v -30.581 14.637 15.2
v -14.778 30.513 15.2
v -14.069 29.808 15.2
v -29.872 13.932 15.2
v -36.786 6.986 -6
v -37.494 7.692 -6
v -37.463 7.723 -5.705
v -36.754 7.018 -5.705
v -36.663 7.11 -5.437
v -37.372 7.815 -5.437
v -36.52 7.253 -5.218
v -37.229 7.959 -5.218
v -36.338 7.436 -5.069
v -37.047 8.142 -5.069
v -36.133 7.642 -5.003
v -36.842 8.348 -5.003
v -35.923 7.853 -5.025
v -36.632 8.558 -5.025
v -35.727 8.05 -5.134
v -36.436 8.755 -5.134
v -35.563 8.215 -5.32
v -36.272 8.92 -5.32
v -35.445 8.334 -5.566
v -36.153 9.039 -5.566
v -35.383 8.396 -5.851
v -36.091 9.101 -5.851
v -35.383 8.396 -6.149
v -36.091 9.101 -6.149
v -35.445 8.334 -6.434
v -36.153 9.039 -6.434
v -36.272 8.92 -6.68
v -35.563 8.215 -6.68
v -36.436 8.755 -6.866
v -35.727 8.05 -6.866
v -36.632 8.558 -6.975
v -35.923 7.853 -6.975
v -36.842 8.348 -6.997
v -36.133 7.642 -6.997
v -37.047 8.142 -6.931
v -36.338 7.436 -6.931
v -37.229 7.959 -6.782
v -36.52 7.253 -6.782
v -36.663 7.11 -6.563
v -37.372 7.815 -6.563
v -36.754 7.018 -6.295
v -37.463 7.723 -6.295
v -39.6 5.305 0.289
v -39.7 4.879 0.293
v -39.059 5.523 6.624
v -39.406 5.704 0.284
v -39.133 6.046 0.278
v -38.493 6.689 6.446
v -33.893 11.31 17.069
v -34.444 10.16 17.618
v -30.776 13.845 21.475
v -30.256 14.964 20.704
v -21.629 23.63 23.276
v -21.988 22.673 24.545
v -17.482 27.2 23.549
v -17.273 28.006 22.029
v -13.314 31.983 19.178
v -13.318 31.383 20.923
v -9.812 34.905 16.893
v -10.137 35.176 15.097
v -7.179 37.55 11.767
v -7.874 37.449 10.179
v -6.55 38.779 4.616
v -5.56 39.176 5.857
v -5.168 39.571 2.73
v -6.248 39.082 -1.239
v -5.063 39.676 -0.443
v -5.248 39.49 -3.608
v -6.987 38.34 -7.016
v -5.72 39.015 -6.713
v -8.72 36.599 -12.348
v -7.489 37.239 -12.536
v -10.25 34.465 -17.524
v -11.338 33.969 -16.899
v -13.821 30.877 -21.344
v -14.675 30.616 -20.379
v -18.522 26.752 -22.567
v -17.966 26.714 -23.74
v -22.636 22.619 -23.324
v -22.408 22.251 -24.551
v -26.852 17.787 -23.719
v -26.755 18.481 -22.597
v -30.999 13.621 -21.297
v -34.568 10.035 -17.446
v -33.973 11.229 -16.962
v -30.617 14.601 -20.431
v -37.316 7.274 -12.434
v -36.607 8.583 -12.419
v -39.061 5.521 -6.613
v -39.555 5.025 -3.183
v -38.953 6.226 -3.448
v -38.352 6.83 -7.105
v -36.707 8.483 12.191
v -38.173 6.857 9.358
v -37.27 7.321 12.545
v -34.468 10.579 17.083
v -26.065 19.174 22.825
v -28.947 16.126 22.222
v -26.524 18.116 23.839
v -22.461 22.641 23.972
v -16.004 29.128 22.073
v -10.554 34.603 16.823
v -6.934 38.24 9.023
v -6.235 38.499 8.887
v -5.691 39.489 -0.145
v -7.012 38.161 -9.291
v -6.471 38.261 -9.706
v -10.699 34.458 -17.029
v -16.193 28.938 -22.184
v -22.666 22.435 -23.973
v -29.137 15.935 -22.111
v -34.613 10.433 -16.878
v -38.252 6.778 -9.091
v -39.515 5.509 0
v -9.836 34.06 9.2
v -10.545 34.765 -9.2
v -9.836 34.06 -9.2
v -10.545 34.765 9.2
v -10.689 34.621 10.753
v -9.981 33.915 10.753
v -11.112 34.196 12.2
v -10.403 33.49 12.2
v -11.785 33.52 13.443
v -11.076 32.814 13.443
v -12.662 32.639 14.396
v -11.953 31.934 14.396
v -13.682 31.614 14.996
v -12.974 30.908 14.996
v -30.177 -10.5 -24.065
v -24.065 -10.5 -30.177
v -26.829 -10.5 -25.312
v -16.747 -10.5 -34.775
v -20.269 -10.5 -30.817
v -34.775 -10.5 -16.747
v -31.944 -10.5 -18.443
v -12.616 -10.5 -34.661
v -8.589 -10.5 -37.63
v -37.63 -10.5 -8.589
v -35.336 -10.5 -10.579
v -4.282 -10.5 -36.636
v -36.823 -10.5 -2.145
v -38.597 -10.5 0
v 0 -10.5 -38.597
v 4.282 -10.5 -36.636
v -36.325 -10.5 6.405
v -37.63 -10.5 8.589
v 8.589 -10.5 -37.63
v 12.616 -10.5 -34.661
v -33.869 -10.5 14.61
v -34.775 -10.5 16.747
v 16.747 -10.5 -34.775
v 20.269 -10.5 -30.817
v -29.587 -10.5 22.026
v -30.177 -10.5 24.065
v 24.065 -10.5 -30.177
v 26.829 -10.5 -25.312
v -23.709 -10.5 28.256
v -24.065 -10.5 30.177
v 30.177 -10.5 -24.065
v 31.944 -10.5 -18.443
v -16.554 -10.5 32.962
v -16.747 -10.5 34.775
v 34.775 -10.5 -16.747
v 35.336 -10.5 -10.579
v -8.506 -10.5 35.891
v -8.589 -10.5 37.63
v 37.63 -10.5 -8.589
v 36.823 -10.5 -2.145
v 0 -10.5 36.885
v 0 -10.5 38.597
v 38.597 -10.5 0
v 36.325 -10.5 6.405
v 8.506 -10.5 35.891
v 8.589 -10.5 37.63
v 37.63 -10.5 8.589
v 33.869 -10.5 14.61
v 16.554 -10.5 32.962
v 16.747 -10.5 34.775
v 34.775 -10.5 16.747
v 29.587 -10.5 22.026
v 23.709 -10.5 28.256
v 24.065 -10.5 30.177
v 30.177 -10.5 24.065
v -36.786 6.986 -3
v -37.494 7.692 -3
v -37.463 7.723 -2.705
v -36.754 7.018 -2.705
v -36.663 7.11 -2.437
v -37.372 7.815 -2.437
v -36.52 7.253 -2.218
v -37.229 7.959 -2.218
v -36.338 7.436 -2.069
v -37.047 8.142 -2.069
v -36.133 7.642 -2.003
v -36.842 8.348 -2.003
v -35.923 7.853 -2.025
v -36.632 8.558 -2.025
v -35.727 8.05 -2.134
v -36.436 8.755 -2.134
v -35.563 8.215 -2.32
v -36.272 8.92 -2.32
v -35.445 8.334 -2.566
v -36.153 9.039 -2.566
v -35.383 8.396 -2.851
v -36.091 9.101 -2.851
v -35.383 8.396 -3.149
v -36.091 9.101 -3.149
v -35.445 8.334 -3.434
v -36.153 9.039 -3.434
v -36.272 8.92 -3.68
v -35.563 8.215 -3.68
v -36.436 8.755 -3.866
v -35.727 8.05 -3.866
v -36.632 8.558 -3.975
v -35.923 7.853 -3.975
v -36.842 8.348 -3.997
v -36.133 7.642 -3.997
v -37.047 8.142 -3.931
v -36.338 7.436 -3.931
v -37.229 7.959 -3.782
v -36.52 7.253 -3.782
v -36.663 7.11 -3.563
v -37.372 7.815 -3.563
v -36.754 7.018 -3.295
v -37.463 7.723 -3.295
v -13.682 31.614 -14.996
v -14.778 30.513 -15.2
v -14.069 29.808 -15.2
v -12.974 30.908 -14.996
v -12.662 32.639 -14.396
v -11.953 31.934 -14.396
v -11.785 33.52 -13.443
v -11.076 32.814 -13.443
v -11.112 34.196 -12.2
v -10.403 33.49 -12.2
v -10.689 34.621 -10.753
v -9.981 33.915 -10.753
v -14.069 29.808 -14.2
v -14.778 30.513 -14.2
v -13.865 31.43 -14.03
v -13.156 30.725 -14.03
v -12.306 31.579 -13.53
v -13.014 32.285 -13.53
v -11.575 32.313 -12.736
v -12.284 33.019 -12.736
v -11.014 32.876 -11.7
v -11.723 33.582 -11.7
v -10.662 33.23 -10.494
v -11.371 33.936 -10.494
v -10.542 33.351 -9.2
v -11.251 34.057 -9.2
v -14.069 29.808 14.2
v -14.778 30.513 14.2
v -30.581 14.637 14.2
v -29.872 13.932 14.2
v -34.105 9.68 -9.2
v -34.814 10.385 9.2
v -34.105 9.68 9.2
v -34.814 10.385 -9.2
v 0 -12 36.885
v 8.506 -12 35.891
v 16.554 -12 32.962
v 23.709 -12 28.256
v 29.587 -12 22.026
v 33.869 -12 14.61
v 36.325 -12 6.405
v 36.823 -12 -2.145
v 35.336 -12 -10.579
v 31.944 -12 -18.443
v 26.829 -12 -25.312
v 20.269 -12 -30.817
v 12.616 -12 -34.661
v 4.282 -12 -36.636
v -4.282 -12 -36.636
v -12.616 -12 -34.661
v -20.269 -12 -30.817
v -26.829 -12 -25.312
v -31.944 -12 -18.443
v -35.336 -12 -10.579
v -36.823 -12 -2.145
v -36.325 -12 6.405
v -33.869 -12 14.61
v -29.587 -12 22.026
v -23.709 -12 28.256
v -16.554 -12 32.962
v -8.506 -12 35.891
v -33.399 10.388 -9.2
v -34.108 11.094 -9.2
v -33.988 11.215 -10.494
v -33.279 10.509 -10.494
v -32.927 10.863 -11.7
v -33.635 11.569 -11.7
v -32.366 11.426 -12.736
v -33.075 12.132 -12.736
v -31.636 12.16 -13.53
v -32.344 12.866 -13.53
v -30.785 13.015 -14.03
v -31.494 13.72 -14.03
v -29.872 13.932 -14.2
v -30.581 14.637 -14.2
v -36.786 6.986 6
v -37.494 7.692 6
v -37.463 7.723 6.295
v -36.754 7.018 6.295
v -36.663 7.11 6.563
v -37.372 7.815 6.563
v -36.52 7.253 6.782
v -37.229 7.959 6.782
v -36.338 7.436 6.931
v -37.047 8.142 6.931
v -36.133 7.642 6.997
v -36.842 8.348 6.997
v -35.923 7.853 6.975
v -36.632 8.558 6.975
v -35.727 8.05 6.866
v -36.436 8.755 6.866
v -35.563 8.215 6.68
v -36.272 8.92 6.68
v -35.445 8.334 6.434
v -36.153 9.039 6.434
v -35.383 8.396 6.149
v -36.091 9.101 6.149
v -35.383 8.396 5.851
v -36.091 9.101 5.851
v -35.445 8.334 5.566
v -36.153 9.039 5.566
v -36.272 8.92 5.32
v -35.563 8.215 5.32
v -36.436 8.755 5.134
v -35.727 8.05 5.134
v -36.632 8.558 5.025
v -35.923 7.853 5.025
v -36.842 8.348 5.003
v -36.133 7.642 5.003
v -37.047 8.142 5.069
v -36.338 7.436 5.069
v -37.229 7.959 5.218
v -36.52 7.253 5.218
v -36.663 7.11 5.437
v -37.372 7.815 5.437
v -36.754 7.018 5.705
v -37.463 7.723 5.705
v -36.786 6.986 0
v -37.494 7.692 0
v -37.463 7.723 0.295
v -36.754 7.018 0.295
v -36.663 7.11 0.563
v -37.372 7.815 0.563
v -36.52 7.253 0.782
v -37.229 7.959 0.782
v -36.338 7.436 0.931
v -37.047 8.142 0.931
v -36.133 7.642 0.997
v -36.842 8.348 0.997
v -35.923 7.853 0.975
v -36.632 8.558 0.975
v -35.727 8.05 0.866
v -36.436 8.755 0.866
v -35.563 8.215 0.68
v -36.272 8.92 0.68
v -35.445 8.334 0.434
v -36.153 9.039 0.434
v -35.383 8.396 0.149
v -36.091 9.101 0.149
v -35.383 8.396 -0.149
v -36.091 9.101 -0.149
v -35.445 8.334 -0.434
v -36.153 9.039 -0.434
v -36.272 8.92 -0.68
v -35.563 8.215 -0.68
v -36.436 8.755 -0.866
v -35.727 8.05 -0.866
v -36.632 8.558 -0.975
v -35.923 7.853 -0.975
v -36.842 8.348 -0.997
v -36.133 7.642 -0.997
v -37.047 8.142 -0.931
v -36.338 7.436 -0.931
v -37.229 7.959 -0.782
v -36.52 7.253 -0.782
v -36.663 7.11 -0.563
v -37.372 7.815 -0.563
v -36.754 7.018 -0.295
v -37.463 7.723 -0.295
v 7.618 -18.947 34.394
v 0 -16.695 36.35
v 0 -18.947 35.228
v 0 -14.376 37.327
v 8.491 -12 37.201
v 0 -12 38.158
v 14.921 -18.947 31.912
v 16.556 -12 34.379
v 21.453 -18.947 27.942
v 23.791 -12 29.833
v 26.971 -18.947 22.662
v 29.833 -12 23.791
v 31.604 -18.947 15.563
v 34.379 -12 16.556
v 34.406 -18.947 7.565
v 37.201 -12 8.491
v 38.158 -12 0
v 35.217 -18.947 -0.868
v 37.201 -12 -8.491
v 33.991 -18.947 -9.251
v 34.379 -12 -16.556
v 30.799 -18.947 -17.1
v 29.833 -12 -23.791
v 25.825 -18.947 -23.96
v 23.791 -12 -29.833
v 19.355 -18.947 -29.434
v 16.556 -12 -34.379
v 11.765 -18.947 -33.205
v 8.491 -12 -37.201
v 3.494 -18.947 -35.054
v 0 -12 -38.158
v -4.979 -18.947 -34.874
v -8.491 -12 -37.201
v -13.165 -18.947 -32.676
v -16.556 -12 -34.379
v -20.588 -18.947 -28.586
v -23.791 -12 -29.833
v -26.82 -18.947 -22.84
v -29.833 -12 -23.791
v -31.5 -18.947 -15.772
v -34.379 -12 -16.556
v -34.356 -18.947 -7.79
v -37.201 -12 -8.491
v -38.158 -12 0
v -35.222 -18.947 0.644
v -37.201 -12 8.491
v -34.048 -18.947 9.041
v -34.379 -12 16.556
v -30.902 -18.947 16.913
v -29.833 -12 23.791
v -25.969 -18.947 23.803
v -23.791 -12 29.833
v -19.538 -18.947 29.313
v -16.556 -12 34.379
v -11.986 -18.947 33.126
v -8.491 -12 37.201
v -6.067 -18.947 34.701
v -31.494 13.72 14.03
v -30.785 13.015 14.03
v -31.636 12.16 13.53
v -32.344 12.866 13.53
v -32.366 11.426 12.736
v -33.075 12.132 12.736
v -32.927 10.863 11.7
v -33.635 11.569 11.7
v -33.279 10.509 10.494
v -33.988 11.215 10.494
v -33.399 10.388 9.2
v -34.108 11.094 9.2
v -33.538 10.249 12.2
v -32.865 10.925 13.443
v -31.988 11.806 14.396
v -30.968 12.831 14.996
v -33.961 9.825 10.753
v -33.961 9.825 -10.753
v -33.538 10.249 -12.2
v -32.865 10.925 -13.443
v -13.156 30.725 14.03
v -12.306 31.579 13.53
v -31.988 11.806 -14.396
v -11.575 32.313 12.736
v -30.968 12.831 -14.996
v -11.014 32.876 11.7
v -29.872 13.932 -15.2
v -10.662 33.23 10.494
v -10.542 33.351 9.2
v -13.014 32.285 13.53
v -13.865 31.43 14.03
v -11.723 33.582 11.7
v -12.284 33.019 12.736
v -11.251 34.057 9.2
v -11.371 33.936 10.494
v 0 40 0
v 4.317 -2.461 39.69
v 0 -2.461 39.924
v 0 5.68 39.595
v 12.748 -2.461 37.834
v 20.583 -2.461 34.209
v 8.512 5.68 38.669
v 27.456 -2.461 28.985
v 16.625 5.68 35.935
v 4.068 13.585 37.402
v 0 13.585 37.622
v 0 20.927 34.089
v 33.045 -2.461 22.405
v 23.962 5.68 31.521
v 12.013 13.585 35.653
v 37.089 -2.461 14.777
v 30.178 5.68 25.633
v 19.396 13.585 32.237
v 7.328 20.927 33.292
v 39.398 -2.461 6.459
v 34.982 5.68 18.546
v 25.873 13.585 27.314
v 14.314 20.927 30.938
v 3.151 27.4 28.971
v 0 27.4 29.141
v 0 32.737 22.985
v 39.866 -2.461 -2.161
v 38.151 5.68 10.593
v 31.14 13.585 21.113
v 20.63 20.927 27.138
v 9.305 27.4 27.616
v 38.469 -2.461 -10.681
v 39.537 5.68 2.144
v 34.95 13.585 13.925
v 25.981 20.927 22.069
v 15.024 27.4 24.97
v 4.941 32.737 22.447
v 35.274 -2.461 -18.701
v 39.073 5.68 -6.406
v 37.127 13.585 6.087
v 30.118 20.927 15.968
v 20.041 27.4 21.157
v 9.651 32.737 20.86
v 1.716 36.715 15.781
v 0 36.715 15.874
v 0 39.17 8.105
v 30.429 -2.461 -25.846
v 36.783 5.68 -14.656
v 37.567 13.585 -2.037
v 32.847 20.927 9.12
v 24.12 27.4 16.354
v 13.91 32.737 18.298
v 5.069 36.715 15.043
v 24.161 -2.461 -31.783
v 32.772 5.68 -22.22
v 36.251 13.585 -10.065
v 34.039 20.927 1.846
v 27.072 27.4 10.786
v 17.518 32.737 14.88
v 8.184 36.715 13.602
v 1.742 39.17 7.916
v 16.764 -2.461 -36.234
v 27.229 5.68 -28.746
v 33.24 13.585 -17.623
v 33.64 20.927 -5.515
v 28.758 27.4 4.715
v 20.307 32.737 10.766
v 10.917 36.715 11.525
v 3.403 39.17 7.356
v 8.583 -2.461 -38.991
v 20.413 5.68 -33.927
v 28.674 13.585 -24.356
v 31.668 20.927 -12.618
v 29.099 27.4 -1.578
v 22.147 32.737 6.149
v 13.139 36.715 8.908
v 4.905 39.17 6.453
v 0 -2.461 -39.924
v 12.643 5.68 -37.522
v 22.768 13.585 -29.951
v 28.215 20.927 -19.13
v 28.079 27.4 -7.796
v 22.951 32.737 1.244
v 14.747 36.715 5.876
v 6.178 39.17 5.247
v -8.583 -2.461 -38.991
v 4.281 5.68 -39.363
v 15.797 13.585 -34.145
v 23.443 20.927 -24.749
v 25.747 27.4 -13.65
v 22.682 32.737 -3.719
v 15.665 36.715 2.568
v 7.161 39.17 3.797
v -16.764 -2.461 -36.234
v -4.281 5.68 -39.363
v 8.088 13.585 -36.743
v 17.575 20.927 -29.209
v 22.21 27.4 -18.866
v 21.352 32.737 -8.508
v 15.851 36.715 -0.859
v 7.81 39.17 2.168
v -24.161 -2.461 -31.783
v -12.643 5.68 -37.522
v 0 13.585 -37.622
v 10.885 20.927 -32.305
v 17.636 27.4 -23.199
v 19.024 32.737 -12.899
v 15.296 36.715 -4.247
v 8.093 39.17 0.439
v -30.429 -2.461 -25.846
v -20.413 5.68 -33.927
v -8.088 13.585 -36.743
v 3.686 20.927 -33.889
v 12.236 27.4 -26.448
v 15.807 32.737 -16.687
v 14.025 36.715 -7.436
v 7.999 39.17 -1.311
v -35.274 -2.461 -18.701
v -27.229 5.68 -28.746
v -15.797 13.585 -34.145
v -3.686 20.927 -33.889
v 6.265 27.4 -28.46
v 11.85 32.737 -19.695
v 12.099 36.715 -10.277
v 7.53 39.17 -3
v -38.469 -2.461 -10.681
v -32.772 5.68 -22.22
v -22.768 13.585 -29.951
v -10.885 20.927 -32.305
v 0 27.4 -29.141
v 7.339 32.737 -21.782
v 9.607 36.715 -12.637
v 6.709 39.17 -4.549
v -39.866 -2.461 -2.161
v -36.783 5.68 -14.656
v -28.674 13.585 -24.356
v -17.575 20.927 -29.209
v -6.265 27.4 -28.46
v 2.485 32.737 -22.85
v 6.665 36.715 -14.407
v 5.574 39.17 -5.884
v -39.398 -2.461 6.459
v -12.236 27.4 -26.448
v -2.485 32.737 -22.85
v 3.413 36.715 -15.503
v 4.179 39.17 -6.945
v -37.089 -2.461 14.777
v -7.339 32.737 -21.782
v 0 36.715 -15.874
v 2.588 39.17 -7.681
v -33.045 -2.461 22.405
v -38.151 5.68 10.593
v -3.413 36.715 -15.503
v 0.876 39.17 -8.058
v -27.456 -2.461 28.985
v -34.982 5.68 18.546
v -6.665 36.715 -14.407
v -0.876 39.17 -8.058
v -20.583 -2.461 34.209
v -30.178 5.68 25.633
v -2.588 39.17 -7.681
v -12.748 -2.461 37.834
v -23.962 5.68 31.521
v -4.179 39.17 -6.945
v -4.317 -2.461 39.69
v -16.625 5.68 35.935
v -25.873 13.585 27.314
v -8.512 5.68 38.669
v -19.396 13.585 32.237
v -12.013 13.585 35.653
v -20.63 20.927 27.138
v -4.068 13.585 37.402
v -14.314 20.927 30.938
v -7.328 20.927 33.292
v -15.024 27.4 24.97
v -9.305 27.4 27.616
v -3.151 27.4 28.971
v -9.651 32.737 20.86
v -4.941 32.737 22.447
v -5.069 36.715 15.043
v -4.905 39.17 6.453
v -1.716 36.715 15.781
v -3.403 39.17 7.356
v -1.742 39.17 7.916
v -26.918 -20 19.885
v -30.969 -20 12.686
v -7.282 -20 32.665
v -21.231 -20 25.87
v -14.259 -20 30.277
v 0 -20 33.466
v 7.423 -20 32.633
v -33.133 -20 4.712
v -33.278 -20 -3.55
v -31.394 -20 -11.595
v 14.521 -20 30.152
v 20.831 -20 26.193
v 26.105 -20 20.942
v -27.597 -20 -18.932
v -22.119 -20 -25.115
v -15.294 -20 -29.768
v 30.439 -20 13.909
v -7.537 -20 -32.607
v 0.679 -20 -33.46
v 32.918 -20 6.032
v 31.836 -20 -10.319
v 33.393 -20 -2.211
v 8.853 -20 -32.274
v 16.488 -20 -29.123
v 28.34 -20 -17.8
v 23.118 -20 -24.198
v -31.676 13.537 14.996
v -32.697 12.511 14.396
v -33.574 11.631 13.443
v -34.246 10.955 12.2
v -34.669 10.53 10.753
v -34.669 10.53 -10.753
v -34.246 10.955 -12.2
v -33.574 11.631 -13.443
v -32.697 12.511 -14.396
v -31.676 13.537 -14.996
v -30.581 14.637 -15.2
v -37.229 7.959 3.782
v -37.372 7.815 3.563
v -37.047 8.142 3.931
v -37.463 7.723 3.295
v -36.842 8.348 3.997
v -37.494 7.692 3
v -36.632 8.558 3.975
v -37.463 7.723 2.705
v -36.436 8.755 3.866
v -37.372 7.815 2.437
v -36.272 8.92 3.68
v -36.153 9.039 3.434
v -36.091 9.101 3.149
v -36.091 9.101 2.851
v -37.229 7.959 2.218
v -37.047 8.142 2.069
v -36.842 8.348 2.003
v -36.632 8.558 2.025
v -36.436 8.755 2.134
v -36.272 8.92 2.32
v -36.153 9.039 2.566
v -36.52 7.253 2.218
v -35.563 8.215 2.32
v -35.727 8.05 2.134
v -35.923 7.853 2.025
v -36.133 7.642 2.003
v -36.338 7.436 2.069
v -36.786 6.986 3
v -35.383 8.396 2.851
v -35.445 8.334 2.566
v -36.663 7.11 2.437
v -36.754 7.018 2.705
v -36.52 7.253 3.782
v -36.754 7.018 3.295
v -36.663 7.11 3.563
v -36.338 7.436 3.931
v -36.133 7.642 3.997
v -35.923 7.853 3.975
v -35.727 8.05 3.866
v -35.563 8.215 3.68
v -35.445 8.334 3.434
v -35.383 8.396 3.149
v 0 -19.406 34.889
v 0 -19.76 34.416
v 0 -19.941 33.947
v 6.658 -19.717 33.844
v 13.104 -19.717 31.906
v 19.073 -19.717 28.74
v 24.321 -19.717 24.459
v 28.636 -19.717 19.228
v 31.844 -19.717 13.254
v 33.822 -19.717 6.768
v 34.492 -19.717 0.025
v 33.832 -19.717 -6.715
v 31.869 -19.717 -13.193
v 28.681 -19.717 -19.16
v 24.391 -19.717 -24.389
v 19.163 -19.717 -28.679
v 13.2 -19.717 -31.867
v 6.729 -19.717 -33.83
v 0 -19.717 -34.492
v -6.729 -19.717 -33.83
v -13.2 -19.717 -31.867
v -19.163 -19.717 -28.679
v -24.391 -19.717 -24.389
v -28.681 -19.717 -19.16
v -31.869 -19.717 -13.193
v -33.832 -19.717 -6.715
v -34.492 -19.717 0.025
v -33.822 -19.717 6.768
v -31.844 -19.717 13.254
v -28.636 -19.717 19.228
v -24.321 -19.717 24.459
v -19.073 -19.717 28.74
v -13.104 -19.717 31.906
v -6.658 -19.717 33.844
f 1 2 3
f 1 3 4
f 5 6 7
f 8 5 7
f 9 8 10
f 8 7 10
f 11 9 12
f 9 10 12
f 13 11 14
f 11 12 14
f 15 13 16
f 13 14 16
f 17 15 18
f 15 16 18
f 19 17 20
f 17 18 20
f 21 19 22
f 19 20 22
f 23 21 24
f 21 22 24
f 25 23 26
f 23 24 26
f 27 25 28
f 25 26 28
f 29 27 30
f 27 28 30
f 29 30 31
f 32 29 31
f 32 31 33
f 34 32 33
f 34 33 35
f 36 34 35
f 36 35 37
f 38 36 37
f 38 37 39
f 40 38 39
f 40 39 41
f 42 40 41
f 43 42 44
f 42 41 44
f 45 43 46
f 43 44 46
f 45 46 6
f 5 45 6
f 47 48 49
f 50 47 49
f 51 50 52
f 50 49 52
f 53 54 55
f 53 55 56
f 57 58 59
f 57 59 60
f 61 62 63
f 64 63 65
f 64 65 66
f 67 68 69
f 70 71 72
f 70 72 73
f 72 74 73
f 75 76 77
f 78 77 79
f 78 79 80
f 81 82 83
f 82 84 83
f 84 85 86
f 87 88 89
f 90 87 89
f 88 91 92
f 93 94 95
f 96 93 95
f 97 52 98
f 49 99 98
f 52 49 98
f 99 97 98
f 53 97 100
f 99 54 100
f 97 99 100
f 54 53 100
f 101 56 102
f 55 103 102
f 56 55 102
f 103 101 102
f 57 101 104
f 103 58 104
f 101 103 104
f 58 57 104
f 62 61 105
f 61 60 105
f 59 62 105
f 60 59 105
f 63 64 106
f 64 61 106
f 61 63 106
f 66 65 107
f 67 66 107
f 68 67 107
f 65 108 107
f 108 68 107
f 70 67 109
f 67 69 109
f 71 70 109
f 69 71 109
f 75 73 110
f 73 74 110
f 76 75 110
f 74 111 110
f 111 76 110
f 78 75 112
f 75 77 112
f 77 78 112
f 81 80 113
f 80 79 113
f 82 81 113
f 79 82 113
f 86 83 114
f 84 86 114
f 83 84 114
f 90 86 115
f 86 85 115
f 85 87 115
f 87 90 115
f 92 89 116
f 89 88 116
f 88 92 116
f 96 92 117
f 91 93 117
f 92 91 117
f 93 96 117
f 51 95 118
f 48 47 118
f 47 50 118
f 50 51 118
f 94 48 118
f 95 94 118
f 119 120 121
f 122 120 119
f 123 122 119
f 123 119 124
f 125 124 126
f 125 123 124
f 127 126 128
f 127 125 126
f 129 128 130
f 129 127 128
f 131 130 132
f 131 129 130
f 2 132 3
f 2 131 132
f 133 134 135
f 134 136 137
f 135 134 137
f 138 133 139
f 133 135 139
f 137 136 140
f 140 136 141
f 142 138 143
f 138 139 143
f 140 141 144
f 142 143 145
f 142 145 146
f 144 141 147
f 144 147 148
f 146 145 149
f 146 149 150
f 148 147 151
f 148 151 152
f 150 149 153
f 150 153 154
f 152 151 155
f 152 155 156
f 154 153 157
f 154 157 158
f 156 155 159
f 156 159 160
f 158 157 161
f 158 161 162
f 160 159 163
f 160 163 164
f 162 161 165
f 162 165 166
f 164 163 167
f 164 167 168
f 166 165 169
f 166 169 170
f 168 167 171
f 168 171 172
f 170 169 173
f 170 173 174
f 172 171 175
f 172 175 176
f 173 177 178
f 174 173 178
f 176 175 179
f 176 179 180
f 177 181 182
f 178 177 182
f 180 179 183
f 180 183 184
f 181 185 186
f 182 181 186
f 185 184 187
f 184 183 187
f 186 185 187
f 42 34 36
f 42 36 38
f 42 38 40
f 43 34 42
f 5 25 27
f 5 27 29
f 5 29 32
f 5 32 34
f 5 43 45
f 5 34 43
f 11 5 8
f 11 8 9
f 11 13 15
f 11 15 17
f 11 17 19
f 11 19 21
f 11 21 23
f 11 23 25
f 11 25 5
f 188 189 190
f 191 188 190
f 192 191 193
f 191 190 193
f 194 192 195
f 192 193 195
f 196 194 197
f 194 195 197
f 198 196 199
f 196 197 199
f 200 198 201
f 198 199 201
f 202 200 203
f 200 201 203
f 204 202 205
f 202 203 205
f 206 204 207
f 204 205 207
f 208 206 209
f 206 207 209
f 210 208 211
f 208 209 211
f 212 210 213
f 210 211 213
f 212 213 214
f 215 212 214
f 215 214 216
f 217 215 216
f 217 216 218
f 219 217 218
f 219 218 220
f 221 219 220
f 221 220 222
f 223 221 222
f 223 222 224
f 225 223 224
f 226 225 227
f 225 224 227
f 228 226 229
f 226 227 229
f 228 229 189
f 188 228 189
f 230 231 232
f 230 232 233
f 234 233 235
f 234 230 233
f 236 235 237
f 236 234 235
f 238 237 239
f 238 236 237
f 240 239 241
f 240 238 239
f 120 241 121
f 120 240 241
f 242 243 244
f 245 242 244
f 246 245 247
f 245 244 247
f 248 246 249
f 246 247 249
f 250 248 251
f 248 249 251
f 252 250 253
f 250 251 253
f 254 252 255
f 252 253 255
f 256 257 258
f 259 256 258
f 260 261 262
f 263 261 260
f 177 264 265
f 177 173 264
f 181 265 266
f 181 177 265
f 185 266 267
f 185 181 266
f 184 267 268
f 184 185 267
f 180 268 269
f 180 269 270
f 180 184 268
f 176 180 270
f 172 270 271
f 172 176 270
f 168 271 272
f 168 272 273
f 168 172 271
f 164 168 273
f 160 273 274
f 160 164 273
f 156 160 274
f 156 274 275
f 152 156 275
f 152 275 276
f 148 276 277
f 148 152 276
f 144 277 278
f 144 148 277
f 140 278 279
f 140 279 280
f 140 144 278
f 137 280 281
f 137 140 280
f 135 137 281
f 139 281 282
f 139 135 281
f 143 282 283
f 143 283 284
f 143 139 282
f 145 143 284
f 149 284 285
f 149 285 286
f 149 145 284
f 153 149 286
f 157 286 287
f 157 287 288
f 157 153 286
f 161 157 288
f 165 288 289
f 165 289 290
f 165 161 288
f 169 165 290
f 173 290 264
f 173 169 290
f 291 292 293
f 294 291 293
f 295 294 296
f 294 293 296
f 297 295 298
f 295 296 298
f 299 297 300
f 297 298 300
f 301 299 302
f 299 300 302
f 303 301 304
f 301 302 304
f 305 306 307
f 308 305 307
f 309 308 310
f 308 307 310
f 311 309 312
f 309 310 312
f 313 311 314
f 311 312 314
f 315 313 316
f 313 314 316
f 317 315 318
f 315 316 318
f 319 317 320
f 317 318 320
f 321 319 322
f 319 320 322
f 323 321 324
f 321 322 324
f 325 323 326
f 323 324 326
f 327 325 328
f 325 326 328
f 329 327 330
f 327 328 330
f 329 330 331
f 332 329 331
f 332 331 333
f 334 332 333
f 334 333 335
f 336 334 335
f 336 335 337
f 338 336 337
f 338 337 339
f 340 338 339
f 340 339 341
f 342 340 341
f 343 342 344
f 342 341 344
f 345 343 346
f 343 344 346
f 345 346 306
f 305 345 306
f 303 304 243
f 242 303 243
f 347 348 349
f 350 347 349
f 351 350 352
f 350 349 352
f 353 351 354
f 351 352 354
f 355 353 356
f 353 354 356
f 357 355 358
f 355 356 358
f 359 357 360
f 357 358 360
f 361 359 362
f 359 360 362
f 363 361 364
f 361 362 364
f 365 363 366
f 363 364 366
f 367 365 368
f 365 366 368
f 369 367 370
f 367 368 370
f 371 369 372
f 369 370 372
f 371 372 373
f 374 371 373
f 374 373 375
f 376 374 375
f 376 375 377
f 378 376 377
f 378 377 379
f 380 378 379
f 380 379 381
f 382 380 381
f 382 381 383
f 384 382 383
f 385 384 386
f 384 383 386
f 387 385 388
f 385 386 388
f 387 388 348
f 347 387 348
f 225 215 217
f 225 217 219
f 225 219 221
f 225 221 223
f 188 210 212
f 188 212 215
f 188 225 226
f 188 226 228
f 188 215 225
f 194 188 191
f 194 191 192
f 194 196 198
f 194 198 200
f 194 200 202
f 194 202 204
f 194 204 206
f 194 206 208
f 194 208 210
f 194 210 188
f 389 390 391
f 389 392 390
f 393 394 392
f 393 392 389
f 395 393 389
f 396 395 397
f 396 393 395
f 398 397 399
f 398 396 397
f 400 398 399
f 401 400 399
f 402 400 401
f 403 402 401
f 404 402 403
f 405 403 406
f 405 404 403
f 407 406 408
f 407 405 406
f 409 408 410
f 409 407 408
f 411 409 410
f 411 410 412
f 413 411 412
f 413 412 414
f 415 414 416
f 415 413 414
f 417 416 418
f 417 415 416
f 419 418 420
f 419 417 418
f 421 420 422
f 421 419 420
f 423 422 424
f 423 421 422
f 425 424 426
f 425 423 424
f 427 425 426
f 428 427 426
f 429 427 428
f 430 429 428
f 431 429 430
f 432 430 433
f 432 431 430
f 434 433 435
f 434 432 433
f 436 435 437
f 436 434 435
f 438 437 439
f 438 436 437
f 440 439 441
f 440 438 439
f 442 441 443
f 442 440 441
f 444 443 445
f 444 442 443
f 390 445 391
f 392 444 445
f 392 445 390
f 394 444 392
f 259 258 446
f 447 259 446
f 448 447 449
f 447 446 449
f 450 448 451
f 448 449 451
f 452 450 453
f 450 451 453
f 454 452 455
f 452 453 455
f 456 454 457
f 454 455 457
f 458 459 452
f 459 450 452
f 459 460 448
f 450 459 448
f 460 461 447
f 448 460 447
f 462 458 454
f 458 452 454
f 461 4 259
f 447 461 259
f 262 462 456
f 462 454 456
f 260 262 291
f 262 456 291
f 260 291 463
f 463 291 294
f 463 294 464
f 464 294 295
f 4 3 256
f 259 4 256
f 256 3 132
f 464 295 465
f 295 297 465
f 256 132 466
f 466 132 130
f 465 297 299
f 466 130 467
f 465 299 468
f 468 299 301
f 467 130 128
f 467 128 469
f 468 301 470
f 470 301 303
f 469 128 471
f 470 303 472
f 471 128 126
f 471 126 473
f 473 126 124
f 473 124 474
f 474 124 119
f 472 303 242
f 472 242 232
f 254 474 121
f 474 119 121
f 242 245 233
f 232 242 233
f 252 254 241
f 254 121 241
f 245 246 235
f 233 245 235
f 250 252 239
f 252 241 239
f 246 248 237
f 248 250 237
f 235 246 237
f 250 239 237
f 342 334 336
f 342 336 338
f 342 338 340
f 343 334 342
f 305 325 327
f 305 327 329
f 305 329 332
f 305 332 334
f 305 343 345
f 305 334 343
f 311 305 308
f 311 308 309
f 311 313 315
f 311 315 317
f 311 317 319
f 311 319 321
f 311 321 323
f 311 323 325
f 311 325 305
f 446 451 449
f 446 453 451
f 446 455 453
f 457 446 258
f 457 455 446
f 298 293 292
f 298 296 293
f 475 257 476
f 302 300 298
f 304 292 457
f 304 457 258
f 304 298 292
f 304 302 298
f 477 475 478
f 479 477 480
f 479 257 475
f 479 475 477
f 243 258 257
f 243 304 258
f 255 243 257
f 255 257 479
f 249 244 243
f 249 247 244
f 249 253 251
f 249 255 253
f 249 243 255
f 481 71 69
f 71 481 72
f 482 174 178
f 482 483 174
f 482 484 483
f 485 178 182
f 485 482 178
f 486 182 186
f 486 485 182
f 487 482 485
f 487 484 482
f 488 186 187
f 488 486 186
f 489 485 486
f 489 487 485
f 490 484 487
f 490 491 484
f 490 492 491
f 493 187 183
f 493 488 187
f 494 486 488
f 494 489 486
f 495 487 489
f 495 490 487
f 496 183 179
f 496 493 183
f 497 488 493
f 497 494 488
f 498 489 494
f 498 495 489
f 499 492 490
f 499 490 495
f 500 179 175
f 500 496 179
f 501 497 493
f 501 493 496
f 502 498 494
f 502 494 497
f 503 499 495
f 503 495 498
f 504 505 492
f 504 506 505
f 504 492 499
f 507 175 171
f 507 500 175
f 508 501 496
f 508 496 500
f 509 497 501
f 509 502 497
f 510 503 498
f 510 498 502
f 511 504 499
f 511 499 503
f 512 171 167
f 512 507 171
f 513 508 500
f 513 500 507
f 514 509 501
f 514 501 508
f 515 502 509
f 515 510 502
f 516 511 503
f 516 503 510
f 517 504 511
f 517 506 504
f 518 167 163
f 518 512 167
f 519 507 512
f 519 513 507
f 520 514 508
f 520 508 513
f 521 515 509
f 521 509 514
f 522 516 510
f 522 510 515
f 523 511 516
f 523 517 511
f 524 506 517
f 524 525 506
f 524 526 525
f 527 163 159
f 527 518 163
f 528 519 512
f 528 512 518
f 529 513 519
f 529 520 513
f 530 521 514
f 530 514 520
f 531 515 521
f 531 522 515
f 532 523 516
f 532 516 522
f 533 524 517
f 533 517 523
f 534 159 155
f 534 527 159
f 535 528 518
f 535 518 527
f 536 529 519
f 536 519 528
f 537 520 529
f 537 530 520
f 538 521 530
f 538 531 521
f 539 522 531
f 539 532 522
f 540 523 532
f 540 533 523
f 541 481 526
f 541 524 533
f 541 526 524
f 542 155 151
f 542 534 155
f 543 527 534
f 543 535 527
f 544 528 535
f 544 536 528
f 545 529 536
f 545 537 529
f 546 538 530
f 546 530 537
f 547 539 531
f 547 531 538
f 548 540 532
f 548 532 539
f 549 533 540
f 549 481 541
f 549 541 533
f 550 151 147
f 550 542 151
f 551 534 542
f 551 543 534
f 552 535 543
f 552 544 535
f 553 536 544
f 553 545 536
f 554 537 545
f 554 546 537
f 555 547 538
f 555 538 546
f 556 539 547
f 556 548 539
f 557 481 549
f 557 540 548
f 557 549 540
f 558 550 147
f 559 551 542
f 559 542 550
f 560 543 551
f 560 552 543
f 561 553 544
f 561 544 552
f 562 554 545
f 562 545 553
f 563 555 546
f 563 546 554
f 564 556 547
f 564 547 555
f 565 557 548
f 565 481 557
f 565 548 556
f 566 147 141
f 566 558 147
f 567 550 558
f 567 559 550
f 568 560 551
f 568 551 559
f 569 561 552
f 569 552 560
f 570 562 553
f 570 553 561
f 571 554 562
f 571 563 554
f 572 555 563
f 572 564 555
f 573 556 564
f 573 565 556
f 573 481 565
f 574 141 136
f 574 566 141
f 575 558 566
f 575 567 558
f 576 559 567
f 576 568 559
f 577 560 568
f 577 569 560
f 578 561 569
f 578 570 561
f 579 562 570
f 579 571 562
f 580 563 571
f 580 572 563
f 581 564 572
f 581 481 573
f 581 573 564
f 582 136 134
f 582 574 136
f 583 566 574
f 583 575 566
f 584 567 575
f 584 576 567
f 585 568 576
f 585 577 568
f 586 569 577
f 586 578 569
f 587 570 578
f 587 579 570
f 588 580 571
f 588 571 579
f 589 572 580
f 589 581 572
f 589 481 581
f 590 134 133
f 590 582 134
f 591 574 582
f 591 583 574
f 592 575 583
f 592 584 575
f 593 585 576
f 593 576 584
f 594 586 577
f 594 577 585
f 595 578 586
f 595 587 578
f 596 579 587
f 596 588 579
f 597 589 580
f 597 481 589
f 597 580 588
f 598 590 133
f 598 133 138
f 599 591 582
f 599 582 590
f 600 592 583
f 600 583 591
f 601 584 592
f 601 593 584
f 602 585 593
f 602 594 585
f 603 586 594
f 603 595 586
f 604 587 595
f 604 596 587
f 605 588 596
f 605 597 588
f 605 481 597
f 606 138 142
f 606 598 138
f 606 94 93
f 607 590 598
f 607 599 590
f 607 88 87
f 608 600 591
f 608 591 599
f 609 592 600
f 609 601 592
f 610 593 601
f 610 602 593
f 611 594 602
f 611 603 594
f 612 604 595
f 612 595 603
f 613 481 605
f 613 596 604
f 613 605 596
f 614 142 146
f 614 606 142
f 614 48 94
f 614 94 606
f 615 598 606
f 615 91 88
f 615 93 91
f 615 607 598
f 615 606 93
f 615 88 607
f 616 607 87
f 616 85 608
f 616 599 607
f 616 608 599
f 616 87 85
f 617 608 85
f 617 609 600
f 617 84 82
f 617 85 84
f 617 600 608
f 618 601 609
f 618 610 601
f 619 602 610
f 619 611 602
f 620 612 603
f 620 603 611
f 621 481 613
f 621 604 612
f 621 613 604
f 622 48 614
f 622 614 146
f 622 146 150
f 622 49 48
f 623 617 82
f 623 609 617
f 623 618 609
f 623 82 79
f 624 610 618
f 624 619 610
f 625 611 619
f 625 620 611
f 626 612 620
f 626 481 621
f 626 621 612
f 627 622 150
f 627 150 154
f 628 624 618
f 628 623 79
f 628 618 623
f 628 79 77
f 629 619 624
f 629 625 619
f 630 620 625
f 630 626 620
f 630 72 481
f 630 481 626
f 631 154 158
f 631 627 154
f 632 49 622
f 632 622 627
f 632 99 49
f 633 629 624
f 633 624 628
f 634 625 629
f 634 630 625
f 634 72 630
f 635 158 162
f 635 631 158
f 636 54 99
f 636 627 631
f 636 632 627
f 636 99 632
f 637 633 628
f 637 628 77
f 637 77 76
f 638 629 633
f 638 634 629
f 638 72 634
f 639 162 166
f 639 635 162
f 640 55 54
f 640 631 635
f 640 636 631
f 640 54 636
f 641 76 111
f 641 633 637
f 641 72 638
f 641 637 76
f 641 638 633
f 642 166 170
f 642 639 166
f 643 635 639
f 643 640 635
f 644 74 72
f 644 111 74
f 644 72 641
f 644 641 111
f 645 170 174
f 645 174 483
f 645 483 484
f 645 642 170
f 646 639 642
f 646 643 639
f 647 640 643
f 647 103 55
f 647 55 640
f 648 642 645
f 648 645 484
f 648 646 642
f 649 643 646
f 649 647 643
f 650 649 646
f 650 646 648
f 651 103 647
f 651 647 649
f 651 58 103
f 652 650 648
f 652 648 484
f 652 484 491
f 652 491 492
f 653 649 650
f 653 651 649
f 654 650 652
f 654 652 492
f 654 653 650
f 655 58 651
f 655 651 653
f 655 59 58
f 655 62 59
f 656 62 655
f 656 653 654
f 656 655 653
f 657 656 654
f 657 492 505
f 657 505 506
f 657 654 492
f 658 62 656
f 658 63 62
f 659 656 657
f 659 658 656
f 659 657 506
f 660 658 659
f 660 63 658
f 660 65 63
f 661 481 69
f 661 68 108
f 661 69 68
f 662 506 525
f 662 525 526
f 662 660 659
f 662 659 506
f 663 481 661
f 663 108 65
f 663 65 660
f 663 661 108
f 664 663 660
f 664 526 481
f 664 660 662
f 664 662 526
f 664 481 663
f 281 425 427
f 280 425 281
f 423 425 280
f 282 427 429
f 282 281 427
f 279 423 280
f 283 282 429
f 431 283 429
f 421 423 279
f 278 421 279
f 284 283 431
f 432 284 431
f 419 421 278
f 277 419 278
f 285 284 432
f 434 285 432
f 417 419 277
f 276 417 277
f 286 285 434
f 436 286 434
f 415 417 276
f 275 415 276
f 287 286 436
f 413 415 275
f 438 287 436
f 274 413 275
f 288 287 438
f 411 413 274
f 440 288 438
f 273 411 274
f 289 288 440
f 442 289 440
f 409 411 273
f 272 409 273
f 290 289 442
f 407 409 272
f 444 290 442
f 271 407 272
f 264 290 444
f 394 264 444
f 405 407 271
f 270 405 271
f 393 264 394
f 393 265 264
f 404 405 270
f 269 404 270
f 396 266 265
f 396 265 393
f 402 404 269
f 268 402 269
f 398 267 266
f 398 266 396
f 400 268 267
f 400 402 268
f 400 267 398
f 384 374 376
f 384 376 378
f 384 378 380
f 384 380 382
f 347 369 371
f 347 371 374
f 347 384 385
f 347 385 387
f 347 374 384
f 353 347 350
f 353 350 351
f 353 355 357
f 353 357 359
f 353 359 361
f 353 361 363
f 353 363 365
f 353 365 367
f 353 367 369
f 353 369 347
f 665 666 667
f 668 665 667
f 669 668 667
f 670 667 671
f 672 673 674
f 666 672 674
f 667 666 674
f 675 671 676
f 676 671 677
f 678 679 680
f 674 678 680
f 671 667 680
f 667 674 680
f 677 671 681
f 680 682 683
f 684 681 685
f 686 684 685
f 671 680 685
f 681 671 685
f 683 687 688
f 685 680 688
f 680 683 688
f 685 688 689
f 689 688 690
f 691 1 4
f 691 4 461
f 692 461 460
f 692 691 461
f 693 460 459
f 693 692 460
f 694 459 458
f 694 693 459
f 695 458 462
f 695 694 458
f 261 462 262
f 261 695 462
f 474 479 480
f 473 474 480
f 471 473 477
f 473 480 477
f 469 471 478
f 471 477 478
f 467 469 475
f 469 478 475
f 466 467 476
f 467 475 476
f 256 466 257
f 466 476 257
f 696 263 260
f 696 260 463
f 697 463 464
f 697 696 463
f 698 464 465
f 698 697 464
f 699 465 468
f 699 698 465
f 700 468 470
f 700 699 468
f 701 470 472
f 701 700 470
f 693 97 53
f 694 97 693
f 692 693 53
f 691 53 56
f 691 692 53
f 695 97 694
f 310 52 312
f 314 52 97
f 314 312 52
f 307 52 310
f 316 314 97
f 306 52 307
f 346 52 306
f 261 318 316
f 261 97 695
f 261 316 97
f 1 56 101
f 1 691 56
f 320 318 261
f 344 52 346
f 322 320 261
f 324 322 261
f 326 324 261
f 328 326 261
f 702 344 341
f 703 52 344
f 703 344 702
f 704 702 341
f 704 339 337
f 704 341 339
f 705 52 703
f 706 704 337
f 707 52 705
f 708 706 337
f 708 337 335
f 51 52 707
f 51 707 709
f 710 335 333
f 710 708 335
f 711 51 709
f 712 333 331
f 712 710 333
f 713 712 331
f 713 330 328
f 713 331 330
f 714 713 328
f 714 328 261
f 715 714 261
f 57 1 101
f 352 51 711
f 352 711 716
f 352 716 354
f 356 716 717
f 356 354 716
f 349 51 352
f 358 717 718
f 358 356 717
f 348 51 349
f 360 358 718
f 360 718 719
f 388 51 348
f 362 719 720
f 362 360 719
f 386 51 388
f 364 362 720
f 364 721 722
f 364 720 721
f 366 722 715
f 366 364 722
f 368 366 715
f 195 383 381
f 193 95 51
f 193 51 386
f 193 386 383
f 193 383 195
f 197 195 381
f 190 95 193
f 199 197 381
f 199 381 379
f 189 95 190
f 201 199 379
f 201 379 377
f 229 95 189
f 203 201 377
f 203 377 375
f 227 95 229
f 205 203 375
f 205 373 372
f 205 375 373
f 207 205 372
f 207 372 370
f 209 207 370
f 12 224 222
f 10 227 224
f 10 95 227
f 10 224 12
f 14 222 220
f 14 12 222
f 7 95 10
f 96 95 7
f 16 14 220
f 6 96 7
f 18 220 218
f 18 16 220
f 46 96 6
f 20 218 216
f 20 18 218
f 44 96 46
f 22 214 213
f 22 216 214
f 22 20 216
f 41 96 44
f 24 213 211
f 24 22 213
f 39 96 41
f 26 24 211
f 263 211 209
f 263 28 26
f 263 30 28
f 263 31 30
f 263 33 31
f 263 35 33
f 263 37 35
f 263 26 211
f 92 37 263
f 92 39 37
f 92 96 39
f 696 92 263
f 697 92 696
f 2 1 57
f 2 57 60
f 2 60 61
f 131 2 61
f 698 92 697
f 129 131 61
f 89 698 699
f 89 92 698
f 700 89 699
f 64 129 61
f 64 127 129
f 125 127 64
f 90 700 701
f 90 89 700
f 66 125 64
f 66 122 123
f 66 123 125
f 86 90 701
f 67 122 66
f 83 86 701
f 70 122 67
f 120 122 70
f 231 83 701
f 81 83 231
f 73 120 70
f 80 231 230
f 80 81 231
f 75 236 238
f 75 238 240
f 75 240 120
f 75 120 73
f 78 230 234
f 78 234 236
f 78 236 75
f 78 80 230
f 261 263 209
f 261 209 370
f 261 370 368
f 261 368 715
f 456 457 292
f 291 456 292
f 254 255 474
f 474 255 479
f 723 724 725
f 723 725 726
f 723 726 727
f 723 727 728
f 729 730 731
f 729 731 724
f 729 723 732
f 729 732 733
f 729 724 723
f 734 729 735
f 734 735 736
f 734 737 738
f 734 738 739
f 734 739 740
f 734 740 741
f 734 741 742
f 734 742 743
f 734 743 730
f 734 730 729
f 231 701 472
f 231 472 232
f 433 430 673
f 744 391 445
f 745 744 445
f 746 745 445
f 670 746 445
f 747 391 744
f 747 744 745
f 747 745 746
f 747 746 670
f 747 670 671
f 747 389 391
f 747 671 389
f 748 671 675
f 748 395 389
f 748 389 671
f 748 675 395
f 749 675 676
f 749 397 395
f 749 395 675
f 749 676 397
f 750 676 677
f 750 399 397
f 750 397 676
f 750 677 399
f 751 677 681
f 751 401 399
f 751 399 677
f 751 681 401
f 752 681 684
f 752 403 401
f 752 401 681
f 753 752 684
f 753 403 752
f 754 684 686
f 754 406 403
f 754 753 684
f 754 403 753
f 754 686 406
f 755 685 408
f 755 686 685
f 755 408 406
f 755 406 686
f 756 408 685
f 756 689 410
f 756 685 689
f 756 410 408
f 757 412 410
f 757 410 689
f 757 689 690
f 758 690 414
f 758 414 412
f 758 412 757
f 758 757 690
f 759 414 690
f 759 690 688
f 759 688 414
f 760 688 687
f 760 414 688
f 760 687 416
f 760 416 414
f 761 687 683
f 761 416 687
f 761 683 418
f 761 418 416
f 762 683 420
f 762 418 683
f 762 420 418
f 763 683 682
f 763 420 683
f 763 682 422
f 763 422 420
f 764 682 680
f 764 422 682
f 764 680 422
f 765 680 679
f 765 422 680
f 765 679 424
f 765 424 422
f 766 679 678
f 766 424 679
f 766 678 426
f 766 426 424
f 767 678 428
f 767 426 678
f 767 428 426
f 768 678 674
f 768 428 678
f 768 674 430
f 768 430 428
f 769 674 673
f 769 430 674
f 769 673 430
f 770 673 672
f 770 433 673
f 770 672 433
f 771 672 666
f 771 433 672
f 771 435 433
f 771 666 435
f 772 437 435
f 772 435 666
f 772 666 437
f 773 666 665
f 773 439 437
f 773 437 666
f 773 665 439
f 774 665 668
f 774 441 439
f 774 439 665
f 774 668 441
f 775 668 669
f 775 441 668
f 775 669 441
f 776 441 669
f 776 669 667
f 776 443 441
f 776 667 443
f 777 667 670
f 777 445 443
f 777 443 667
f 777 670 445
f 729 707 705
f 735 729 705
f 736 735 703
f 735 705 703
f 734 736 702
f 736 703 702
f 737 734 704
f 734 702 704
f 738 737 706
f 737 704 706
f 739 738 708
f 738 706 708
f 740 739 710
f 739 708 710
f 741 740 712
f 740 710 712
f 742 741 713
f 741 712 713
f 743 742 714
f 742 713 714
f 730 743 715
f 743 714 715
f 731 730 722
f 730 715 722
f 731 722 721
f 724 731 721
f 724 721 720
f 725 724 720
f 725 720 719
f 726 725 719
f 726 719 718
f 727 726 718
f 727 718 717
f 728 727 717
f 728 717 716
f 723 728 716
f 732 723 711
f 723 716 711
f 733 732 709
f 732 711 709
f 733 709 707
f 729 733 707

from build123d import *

# Parameters (mm, degrees)
CUT_EXTRUDE1_DEPTH      = 70.282032303
CUT_EXTRUDE1_DEPTH_BACK = 70.282032303
SKETCH3_W               = 80
SKETCH3_H               = 50
CUT_EXTRUDE2_DEPTH      = 70.282032303
CUT_EXTRUDE2_DEPTH_BACK = 70.282032303
CUT_EXTRUDE3_DEPTH      = 1
SKETCH6_R               = 1
CUT_EXTRUDE4_DEPTH      = 1
FILLET1_R               = 2
SKETCH7_W               = 3
SKETCH7_H               = 1.5
FILLET2_R               = 2


with BuildPart() as part:
    # Sketch2 → Revolve4 (revolve)
    with BuildSketch(Plane(origin=(0, 0, 0), x_dir=(0, 0, -1), z_dir=(1, 0, 0))):
        with BuildLine():
            Line((0, 40), (0, -40))
            ThreePointArc((0, -40), (-40, 0), (0, 40))
        make_face()
    revolve(axis=Axis((0, 0, 0), (0, 1, 0)))

    # Sketch3 → Cut-Extrude1 (cut, two sides: drawn at the far end of the back side and taken through both)
    with BuildSketch(Plane.XY.offset(-CUT_EXTRUDE1_DEPTH_BACK)):
        with Locations((0, -45)):
            Rectangle(SKETCH3_W, SKETCH3_H)
    extrude(amount=CUT_EXTRUDE1_DEPTH + CUT_EXTRUDE1_DEPTH_BACK, mode=Mode.SUBTRACT)

    # Sketch4 → Cut-Extrude2 (cut, two sides: drawn at the far end of the back side and taken through both)
    with BuildSketch(Plane.XY.offset(-CUT_EXTRUDE2_DEPTH_BACK)):
        Polygon((-40.264401604, 4.909155965), (-4.990432392, 40.34567803), (-21.331481222, 54.070064096), (-80.21701071, 4.909155965), align=None)
    extrude(amount=CUT_EXTRUDE2_DEPTH + CUT_EXTRUDE2_DEPTH_BACK, mode=Mode.SUBTRACT)

    # Sketch5 → Cut-Extrude3 (cut)
    with BuildSketch(Plane(origin=(-22.679314195, 22.575280643, 0), x_dir=(0, 0, 1), z_dir=(-0.708730441300506, 0.705479384230319, 0))):
        with BuildLine():
            Line((15.2, 11.2), (15.2, -11.2))
            ThreePointArc((15.2, -11.2), (13.442640687, -15.442640687), (9.2, -17.2))
            Line((9.2, -17.2), (-9.2, -17.2))
            ThreePointArc((-9.2, -17.2), (-13.442640687, -15.442640687), (-15.2, -11.2))
            Line((-15.2, -11.2), (-15.2, 11.2))
            ThreePointArc((-15.2, 11.2), (-13.442640687, 15.442640687), (-9.2, 17.2))
            Line((-9.2, 17.2), (9.2, 17.2))
            ThreePointArc((9.2, 17.2), (13.442640687, 15.442640687), (15.2, 11.2))
        make_face()
        with BuildLine():
            Line((-9.2, 16.2), (9.2, 16.2))
            ThreePointArc((9.2, 16.2), (12.735533906, 14.735533906), (14.2, 11.2))
            Line((14.2, 11.2), (14.2, -11.2))
            ThreePointArc((14.2, -11.2), (12.735533906, -14.735533906), (9.2, -16.2))
            Line((9.2, -16.2), (-9.2, -16.2))
            ThreePointArc((-9.2, -16.2), (-12.735533906, -14.735533906), (-14.2, -11.2))
            Line((-14.2, -11.2), (-14.2, 11.2))
            ThreePointArc((-14.2, 11.2), (-12.735533906, 14.735533906), (-9.2, 16.2))
        make_face(mode=Mode.SUBTRACT)
    extrude(amount=-CUT_EXTRUDE3_DEPTH, mode=Mode.SUBTRACT)

    # Sketch6 → Cut-Extrude4 (cut)
    with BuildSketch(Plane(origin=(-22.679314195, 22.575280643, 0), x_dir=(0, 0, 1), z_dir=(-0.708730441300506, 0.705479384230319, 0))):
        with Locations(Location((0, -20, 0), (0, 0, 270))):
            Circle(SKETCH6_R)
        with Locations(Location((3, -20, 0), (0, 0, 270))):
            Circle(SKETCH6_R)
        with Locations(Location((6, -20, 0), (0, 0, 270))):
            Circle(SKETCH6_R)
        with Locations(Location((-3, -20, 0), (0, 0, 270))):
            Circle(SKETCH6_R)
        with Locations(Location((-6, -20, 0), (0, 0, 270))):
            Circle(SKETCH6_R)
    extrude(amount=-CUT_EXTRUDE4_DEPTH, mode=Mode.SUBTRACT)

    # Fillet1
    fillet1_edges = [part.edges().sort_by_distance(p)[0] for p in [
        (-5.747729438, 39.584891137, 0),
    ]]
    fillet(fillet1_edges, radius=FILLET1_R)

    # Sketch7 → Cut-Revolve1 (revolve, cut)
    with BuildSketch(Plane(origin=(0, 0, 0), x_dir=(0, 0, -1), z_dir=(1, 0, 0))):
        with Locations((-38.385381332, -11.25)):
            Rectangle(SKETCH7_W, SKETCH7_H)
    revolve(axis=Axis((0, 0, 0), (0, 1, 0)), mode=Mode.SUBTRACT)

    # Fillet2
    fillet2_edges = [part.edges().sort_by_distance(p)[0] for p in [
        (0, -20, -34.641016151),
    ]]
    fillet(fillet2_edges, radius=FILLET2_R)


solid = part.part
